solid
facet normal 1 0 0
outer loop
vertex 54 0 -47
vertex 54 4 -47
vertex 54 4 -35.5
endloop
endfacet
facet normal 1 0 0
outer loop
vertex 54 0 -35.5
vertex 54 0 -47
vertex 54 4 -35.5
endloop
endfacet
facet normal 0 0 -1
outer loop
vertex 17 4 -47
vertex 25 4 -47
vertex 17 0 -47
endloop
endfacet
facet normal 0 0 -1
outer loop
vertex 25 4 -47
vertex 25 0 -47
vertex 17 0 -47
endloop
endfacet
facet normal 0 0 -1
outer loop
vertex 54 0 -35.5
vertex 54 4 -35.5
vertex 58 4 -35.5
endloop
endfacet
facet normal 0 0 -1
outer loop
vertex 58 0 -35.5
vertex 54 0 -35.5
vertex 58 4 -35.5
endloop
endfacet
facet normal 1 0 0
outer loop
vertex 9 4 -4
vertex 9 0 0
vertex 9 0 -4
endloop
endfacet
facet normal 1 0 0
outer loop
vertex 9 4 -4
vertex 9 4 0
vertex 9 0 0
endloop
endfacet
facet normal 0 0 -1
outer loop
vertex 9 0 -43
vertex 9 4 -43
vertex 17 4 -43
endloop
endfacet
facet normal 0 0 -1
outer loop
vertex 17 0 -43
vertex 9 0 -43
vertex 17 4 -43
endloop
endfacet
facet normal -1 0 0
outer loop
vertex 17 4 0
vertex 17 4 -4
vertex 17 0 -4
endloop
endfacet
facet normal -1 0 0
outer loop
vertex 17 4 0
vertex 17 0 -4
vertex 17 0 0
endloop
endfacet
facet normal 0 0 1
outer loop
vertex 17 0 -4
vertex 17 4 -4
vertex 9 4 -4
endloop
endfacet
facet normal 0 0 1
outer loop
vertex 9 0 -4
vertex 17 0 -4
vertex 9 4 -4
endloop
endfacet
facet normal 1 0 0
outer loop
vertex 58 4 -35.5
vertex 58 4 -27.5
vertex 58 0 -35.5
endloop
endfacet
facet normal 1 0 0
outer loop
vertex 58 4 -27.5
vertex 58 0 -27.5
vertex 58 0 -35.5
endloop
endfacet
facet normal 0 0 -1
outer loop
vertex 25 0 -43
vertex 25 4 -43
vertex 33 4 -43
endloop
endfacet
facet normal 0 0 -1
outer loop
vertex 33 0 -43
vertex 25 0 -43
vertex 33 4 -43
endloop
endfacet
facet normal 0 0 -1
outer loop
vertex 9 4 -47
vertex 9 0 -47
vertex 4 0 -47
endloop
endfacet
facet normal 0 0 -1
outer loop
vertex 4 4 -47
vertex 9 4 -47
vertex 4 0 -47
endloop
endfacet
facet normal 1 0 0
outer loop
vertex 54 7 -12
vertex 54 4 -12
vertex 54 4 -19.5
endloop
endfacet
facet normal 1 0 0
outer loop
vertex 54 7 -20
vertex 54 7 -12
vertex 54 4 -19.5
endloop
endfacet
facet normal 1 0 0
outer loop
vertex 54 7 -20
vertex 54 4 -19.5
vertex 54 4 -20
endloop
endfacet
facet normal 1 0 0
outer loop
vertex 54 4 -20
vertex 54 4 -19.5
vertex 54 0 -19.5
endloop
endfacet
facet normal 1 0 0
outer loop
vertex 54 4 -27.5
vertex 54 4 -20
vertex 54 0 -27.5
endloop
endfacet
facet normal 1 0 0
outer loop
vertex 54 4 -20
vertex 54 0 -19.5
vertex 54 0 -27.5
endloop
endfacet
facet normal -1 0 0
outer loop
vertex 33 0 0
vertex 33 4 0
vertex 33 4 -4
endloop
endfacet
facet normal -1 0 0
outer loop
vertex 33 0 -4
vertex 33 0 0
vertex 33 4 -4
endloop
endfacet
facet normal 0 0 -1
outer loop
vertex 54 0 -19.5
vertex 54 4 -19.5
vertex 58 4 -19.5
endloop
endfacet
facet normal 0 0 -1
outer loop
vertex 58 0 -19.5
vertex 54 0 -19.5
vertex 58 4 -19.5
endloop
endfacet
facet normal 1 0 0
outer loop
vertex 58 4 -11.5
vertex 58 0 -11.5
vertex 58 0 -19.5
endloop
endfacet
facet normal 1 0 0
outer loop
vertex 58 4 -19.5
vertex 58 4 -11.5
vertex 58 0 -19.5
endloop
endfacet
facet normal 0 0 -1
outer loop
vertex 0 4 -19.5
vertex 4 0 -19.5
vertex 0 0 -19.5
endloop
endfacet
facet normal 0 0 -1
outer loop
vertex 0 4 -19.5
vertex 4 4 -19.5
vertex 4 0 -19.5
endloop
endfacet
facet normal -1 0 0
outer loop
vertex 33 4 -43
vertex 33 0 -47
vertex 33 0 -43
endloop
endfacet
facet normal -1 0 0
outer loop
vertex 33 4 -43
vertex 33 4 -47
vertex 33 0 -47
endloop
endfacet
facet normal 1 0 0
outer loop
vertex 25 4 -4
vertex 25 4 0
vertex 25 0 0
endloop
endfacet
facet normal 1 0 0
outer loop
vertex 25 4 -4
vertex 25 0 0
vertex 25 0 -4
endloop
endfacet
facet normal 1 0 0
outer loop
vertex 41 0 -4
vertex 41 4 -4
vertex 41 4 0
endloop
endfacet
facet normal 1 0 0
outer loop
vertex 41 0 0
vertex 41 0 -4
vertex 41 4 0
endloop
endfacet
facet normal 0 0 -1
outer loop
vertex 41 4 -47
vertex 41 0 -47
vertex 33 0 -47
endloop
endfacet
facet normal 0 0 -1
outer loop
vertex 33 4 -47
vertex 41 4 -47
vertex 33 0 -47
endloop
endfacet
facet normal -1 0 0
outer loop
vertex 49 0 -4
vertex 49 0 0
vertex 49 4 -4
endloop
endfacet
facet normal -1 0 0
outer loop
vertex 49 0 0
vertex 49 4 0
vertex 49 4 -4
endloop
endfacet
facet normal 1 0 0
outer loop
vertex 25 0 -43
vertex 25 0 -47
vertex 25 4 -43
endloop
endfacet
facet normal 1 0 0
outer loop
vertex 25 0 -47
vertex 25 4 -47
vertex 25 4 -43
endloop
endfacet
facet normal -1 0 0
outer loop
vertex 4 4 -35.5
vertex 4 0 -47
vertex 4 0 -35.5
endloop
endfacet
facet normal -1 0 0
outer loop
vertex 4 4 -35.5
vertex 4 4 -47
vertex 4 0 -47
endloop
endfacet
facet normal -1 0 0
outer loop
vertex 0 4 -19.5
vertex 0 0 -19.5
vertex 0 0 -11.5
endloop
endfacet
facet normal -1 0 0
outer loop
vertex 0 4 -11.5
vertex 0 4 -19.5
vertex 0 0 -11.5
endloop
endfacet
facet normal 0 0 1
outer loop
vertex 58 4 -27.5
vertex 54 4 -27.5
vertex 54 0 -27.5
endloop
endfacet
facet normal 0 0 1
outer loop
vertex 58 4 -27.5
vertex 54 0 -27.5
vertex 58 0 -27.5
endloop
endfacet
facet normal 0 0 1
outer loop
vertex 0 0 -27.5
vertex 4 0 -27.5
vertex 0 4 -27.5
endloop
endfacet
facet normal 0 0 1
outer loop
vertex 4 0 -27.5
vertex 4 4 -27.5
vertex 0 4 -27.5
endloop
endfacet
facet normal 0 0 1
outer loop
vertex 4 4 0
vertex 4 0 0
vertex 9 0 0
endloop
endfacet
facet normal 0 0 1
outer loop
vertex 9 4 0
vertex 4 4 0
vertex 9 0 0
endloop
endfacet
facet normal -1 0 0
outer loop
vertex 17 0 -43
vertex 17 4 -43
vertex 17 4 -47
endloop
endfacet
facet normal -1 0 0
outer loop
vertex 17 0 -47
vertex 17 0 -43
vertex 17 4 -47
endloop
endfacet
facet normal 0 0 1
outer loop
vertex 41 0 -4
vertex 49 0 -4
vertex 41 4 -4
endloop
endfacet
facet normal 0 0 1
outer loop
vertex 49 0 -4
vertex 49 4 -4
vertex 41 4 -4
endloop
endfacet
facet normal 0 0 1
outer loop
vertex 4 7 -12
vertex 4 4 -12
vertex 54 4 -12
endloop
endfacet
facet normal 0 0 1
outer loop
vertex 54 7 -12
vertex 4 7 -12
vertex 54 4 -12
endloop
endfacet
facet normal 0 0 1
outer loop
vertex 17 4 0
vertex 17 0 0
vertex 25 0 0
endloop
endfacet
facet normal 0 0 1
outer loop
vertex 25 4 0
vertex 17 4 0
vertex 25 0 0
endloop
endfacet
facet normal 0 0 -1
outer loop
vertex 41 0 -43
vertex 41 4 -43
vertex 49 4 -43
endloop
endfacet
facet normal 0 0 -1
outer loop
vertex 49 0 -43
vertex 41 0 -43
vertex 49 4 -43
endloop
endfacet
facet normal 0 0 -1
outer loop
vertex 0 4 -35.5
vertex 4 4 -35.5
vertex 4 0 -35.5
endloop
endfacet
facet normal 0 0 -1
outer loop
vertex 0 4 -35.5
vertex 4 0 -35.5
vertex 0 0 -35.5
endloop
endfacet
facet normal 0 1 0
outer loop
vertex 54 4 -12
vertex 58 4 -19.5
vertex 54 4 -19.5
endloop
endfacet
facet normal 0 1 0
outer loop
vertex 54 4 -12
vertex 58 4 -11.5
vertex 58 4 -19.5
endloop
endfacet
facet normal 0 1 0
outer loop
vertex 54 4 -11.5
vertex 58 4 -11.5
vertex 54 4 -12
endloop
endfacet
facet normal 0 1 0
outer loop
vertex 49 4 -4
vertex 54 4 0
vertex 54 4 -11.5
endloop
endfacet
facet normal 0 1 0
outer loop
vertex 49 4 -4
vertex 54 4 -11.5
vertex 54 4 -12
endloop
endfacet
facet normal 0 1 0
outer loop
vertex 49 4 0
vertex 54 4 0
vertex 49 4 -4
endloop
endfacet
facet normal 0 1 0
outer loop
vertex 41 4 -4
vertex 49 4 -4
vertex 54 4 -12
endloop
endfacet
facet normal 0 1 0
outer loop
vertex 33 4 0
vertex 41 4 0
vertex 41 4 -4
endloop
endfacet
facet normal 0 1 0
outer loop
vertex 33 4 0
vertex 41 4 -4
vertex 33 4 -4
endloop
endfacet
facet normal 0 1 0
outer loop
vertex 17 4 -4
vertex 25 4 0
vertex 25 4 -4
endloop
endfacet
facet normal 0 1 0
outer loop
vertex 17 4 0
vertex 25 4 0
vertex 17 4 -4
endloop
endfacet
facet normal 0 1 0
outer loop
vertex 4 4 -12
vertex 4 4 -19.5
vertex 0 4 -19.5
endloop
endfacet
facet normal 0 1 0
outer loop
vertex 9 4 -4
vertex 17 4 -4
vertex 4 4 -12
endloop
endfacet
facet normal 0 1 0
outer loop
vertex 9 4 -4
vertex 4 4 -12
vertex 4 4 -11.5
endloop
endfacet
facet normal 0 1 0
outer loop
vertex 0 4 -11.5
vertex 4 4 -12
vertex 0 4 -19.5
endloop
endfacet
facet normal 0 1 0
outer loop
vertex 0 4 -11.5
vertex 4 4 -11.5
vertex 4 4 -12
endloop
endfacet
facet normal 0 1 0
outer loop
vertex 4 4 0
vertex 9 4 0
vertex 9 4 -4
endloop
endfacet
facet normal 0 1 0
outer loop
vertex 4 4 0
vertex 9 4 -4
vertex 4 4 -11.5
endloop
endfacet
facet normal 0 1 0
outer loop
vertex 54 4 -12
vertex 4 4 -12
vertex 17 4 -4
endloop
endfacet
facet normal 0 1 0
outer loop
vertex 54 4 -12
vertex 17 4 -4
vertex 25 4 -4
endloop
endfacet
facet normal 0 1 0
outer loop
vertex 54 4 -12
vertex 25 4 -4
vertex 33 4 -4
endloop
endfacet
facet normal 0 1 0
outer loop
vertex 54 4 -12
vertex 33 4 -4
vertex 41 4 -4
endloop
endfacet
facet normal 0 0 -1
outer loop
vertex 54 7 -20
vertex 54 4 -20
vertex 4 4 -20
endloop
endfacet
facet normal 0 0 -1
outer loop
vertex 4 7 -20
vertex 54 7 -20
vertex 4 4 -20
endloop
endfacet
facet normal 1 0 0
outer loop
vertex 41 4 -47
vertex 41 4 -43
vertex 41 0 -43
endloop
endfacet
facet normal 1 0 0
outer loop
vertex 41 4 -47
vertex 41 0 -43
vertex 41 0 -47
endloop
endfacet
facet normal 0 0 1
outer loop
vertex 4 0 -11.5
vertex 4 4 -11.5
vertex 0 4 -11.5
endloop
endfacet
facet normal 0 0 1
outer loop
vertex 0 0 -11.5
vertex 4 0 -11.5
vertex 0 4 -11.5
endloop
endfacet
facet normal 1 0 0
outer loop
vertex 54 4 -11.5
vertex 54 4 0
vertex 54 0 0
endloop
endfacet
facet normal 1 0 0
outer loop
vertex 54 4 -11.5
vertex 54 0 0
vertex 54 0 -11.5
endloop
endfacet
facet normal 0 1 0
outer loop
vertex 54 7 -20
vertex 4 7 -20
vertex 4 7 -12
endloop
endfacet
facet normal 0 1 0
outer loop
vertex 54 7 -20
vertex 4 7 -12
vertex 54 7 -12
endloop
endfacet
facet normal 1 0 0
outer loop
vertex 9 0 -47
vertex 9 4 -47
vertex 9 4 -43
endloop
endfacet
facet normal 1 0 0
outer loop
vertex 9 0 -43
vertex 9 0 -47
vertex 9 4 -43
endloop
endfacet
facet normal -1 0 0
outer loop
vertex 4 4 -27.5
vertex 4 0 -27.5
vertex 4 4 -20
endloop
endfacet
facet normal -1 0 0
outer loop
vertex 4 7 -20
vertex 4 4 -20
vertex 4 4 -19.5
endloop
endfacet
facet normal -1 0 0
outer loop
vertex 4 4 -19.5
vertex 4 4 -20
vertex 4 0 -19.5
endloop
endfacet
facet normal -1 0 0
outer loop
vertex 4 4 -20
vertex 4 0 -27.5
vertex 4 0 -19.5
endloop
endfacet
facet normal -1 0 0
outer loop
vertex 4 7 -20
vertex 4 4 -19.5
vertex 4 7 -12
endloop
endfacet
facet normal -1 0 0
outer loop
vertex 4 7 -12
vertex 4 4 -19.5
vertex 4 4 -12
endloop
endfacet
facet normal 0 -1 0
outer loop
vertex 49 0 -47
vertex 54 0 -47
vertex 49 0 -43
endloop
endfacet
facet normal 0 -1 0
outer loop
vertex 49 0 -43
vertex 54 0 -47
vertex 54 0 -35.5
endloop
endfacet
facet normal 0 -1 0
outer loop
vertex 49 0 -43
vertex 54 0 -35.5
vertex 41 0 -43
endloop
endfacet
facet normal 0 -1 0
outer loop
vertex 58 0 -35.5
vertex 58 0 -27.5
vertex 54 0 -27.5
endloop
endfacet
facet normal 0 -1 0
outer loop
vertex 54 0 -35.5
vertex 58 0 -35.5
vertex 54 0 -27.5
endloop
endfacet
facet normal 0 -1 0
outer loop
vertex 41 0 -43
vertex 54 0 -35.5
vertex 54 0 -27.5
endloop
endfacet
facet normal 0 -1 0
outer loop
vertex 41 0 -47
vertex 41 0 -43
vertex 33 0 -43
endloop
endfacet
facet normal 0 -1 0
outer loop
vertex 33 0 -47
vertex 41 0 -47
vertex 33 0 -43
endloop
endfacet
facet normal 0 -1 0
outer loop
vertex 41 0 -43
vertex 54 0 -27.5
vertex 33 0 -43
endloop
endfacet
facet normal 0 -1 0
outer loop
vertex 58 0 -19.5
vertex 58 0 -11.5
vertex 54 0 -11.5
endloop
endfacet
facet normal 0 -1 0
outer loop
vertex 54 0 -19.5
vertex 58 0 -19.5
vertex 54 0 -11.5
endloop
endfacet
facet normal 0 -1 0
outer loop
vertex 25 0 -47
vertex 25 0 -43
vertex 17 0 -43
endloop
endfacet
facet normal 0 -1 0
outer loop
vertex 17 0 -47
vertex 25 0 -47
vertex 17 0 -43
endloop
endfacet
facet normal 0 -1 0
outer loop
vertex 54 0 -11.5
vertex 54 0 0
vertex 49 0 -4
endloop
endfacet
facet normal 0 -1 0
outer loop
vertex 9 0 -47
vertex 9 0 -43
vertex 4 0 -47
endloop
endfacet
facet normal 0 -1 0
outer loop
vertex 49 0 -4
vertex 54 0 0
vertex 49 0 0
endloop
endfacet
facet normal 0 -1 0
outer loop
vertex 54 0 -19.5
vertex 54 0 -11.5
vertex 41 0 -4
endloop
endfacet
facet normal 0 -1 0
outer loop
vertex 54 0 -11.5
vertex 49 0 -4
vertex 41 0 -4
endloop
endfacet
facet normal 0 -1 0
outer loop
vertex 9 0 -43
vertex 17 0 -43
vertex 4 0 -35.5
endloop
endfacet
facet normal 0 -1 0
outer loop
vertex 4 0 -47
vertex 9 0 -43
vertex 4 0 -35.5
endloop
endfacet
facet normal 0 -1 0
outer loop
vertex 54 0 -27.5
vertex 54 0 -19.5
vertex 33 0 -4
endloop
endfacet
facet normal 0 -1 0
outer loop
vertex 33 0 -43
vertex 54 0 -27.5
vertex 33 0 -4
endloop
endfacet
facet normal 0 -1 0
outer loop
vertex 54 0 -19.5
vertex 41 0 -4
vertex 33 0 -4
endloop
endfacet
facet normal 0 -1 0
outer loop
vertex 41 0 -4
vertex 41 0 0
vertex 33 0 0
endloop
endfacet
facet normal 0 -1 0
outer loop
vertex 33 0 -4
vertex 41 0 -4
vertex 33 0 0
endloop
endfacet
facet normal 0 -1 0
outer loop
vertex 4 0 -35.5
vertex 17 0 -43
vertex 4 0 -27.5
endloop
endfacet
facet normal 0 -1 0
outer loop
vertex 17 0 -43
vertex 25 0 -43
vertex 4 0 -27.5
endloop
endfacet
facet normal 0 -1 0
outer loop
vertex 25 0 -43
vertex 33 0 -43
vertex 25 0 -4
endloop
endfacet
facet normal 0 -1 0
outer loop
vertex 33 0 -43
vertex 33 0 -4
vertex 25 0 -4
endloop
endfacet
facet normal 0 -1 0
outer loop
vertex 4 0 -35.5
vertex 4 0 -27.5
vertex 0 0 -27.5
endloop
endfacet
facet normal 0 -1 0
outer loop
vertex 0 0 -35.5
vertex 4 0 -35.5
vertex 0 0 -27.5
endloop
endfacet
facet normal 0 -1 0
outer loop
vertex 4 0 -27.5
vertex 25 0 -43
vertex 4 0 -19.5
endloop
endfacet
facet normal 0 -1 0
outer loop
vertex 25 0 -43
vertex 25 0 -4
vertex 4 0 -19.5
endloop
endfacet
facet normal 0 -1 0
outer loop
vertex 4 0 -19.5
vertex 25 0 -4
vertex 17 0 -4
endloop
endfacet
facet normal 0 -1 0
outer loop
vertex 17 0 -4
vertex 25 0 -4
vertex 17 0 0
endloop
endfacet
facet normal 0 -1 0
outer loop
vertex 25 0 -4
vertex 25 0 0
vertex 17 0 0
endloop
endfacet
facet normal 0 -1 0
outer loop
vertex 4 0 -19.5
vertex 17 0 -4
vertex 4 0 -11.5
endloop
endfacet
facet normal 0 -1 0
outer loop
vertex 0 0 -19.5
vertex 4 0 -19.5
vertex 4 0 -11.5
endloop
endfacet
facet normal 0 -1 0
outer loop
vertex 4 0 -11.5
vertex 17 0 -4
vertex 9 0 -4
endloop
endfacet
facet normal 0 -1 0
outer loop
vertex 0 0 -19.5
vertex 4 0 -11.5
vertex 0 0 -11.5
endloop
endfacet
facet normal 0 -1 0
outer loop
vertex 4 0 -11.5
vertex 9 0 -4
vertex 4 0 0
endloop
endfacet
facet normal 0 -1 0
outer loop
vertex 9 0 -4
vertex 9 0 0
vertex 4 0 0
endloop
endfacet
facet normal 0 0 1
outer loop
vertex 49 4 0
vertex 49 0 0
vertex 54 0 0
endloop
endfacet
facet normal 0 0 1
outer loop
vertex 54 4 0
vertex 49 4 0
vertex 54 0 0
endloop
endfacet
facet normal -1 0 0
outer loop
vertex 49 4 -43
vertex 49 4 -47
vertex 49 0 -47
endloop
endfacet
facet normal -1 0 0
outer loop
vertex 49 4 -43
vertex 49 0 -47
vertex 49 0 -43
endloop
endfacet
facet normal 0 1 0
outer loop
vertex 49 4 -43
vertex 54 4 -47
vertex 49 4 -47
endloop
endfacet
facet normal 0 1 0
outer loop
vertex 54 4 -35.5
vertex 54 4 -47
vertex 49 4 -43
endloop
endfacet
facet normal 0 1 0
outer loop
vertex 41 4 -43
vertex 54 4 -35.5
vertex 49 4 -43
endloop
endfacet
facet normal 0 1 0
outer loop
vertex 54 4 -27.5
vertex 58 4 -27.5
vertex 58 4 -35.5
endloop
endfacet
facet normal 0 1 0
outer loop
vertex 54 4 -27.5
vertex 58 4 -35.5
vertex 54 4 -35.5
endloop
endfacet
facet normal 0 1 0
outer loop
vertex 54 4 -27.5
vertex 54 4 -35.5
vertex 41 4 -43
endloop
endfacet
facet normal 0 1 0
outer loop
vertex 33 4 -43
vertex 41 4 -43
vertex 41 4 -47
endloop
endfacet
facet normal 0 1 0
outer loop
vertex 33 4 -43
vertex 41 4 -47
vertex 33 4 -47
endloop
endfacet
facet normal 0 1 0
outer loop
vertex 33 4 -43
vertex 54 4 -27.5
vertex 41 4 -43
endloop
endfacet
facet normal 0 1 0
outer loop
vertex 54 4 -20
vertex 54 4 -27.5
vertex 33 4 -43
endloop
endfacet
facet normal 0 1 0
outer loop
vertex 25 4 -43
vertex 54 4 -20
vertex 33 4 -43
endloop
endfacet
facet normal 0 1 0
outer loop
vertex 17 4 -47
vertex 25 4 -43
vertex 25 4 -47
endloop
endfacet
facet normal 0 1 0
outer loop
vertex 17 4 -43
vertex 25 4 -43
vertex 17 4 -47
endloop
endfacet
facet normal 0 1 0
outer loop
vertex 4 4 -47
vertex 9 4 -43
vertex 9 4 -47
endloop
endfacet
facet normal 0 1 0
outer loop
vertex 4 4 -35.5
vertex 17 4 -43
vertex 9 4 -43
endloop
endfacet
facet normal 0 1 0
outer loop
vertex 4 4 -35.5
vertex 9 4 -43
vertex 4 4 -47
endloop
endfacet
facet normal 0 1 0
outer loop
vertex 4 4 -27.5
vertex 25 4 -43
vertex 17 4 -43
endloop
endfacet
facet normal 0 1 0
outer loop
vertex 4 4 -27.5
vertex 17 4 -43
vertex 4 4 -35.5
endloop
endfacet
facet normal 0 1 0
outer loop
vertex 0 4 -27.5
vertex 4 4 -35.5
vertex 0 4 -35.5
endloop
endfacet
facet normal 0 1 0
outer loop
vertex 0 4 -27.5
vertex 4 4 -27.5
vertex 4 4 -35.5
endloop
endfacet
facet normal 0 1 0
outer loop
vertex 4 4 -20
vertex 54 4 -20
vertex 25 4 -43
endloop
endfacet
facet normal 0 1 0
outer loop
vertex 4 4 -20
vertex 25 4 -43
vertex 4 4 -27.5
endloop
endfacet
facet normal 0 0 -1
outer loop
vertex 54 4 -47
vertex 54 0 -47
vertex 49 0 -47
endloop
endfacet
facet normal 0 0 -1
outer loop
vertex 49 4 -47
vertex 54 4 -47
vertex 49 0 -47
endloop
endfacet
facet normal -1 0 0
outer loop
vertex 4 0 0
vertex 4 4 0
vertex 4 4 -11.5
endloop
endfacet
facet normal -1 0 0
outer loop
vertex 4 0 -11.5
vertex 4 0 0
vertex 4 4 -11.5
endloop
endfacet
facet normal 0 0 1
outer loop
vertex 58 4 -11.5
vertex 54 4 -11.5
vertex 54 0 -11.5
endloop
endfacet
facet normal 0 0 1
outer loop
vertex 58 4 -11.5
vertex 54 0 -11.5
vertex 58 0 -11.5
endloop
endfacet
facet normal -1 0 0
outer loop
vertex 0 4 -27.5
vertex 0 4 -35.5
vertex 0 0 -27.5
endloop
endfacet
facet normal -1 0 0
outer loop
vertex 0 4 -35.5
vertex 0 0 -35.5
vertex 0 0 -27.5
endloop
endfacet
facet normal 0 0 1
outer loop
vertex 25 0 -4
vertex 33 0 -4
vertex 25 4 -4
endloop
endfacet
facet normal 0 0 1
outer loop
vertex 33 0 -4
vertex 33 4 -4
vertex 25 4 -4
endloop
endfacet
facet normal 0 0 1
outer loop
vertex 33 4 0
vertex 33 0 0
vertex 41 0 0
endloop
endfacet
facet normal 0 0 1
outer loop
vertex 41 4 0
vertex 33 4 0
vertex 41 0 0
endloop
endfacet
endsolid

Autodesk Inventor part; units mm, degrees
ref_plane "YZ Plane" through (0, 0, 0) normal (1, 0, 0) x (0, 1, 0)
ref_plane "XZ Plane" through (0, 0, 0) normal (0, 1, 0) x (-1, 0, 0)
ref_plane "XY Plane" through (0, 0, 0) normal (0, 0, 1) x (1, 0, 0)
sketch "Sketch1" plane through (0, 0, 0) normal (0, 1, 0) x (-1, 0, 0)
  line L0 (0, 0) -> (-58, 0)
  line L1 (-58, 0) -> (-58, -47)
  line L2 (-58, -47) -> (0, -47)
  line L3 (0, -47) -> (0, 0)
  dimension "d0" = 58
  dimension "d1" = 47
extrude "Extrusion1" add sketch "Sketch1" along normal blind 4
sketch "Sketch2" plane through (0, 4, 0) normal (0, 1, 0) x (1, 0, 0)
  line L0 (58, 47) -> (0, 47) projected
  line L1 (0, 47) -> (0, 0) projected
  line L2 (0, 0) -> (58, 0) projected
  line L3 (58, 0) -> (58, 47) projected
  line L4 (4, 43) -> (54, 43)
  line L5 (54, 43) -> (54, 4)
  line L6 (54, 4) -> (4, 4)
  line L7 (4, 4) -> (4, 43)
  line L8 (4, 47) -> (4, 35.5)
  line L9 (4, 35.5) -> (0, 35.5)
  line L10 (0, 47) -> (4, 47)
  line L11 (0, 35.5) -> (0, 47)
  line L12 (0, 23.5) -> (58, 23.5) construction
  line L13 (4, 27.5) -> (0, 27.5)
  line L14 (0, 27.5) -> (0, 23.5)
  line L15 (4, 27.5) -> (4, 23.5)
  line L16 (29, 23.5) -> (29, 47) construction
  line L17 (9, 47) -> (9, 43)
  line L18 (9, 43) -> (17, 43)
  line L19 (17, 43) -> (17, 47)
  line L20 (9, 47) -> (17, 47)
  line L21 (25, 47) -> (25, 43)
  line L22 (29, 43) -> (25, 43)
  line L23 (25, 47) -> (29, 47)
  line L24 (54, 47) -> (54, 35.5)
  line L25 (54, 35.5) -> (58, 35.5)
  line L26 (58, 47) -> (54, 47)
  line L27 (58, 35.5) -> (58, 47)
  line L28 (54, 27.5) -> (58, 27.5)
  line L29 (58, 27.5) -> (58, 23.5)
  line L30 (54, 27.5) -> (54, 23.5)
  line L31 (49, 47) -> (49, 43)
  line L32 (49, 43) -> (41, 43)
  line L33 (41, 43) -> (41, 47)
  line L34 (49, 47) -> (41, 47)
  line L35 (33, 47) -> (33, 43)
  line L36 (29, 43) -> (33, 43)
  line L37 (33, 47) -> (29, 47)
  line L38 (58, 0) -> (0, 0)
  line L39 (4, 4) -> (54, 4)
  line L40 (4, 0) -> (4, 11.5)
  line L41 (4, 11.5) -> (0, 11.5)
  line L42 (0, 0) -> (4, 0)
  line L43 (0, 11.5) -> (0, 0)
  line L44 (4, 19.5) -> (0, 19.5)
  line L45 (0, 19.5) -> (0, 23.5)
  line L46 (4, 19.5) -> (4, 23.5)
  line L47 (29, 23.5) -> (29, 0) construction
  line L48 (9, 0) -> (9, 4)
  line L49 (9, 4) -> (17, 4)
  line L50 (17, 4) -> (17, 0)
  line L51 (9, 0) -> (17, 0)
  line L52 (25, 0) -> (25, 4)
  line L53 (29, 4) -> (25, 4)
  line L54 (25, 0) -> (29, 0)
  line L55 (58, 19.5) -> (58, 23.5)
  line L56 (54, 19.5) -> (54, 23.5)
  line L57 (54, 11.5) -> (58, 11.5)
  line L58 (58, 11.5) -> (58, 0)
  line L59 (58, 0) -> (54, 0)
  line L60 (29, 4) -> (33, 4)
  line L61 (33, 0) -> (33, 4)
  line L62 (33, 0) -> (29, 0)
  line L63 (54, 19.5) -> (58, 19.5)
  line L64 (54, 0) -> (54, 11.5)
  line L65 (49, 4) -> (41, 4)
  line L66 (41, 4) -> (41, 0)
  line L67 (49, 0) -> (49, 4)
  line L68 (49, 0) -> (41, 0)
  dimension "d8" = 4
  dimension "d11" = 8
  dimension "d12" = 8
  dimension "d13" = 4
  dimension "d16" = 4
  dimension "d17" = 8
extrude "Extrusion2" cut sketch "Sketch2" against normal up to surface (4 mm away) contours L3 L25 L5 L24 L0 | L31 L4 L33 L0 | L3 L63 L5 L28 | L35 L4 L21 L0 | L3 L2 L64 L5 L57 | L19 L4 L17 L0 | L2 L66 L6 L67 | L8 L7 L9 L1 L0 | L2 L52 L6 L61 | L13 L7 L44 L1 | L2 L48 L6 L50 | L41 L7 L40 L2 L1
sketch "Sketch3" plane through (0, 4, 0) normal (0, 1, 0) x (1, 0, 0)
  line L0 (4, 11.5) -> (4, 0) projected
  line L1 (4, 12) -> (54, 12)
  line L2 (54, 12) -> (54, 20)
  line L3 (54, 20) -> (4, 20)
  line L4 (4, 20) -> (4, 12)
  line L5 (9, 4) -> (17, 4) projected
  point P0 (0, 0)
  dimension "d18" = 8
  dimension "d19" = 8
extrude "Extrusion3" add sketch "Sketch3" along normal blind 3
properties part number "front" material "PBT Plastic Black"
